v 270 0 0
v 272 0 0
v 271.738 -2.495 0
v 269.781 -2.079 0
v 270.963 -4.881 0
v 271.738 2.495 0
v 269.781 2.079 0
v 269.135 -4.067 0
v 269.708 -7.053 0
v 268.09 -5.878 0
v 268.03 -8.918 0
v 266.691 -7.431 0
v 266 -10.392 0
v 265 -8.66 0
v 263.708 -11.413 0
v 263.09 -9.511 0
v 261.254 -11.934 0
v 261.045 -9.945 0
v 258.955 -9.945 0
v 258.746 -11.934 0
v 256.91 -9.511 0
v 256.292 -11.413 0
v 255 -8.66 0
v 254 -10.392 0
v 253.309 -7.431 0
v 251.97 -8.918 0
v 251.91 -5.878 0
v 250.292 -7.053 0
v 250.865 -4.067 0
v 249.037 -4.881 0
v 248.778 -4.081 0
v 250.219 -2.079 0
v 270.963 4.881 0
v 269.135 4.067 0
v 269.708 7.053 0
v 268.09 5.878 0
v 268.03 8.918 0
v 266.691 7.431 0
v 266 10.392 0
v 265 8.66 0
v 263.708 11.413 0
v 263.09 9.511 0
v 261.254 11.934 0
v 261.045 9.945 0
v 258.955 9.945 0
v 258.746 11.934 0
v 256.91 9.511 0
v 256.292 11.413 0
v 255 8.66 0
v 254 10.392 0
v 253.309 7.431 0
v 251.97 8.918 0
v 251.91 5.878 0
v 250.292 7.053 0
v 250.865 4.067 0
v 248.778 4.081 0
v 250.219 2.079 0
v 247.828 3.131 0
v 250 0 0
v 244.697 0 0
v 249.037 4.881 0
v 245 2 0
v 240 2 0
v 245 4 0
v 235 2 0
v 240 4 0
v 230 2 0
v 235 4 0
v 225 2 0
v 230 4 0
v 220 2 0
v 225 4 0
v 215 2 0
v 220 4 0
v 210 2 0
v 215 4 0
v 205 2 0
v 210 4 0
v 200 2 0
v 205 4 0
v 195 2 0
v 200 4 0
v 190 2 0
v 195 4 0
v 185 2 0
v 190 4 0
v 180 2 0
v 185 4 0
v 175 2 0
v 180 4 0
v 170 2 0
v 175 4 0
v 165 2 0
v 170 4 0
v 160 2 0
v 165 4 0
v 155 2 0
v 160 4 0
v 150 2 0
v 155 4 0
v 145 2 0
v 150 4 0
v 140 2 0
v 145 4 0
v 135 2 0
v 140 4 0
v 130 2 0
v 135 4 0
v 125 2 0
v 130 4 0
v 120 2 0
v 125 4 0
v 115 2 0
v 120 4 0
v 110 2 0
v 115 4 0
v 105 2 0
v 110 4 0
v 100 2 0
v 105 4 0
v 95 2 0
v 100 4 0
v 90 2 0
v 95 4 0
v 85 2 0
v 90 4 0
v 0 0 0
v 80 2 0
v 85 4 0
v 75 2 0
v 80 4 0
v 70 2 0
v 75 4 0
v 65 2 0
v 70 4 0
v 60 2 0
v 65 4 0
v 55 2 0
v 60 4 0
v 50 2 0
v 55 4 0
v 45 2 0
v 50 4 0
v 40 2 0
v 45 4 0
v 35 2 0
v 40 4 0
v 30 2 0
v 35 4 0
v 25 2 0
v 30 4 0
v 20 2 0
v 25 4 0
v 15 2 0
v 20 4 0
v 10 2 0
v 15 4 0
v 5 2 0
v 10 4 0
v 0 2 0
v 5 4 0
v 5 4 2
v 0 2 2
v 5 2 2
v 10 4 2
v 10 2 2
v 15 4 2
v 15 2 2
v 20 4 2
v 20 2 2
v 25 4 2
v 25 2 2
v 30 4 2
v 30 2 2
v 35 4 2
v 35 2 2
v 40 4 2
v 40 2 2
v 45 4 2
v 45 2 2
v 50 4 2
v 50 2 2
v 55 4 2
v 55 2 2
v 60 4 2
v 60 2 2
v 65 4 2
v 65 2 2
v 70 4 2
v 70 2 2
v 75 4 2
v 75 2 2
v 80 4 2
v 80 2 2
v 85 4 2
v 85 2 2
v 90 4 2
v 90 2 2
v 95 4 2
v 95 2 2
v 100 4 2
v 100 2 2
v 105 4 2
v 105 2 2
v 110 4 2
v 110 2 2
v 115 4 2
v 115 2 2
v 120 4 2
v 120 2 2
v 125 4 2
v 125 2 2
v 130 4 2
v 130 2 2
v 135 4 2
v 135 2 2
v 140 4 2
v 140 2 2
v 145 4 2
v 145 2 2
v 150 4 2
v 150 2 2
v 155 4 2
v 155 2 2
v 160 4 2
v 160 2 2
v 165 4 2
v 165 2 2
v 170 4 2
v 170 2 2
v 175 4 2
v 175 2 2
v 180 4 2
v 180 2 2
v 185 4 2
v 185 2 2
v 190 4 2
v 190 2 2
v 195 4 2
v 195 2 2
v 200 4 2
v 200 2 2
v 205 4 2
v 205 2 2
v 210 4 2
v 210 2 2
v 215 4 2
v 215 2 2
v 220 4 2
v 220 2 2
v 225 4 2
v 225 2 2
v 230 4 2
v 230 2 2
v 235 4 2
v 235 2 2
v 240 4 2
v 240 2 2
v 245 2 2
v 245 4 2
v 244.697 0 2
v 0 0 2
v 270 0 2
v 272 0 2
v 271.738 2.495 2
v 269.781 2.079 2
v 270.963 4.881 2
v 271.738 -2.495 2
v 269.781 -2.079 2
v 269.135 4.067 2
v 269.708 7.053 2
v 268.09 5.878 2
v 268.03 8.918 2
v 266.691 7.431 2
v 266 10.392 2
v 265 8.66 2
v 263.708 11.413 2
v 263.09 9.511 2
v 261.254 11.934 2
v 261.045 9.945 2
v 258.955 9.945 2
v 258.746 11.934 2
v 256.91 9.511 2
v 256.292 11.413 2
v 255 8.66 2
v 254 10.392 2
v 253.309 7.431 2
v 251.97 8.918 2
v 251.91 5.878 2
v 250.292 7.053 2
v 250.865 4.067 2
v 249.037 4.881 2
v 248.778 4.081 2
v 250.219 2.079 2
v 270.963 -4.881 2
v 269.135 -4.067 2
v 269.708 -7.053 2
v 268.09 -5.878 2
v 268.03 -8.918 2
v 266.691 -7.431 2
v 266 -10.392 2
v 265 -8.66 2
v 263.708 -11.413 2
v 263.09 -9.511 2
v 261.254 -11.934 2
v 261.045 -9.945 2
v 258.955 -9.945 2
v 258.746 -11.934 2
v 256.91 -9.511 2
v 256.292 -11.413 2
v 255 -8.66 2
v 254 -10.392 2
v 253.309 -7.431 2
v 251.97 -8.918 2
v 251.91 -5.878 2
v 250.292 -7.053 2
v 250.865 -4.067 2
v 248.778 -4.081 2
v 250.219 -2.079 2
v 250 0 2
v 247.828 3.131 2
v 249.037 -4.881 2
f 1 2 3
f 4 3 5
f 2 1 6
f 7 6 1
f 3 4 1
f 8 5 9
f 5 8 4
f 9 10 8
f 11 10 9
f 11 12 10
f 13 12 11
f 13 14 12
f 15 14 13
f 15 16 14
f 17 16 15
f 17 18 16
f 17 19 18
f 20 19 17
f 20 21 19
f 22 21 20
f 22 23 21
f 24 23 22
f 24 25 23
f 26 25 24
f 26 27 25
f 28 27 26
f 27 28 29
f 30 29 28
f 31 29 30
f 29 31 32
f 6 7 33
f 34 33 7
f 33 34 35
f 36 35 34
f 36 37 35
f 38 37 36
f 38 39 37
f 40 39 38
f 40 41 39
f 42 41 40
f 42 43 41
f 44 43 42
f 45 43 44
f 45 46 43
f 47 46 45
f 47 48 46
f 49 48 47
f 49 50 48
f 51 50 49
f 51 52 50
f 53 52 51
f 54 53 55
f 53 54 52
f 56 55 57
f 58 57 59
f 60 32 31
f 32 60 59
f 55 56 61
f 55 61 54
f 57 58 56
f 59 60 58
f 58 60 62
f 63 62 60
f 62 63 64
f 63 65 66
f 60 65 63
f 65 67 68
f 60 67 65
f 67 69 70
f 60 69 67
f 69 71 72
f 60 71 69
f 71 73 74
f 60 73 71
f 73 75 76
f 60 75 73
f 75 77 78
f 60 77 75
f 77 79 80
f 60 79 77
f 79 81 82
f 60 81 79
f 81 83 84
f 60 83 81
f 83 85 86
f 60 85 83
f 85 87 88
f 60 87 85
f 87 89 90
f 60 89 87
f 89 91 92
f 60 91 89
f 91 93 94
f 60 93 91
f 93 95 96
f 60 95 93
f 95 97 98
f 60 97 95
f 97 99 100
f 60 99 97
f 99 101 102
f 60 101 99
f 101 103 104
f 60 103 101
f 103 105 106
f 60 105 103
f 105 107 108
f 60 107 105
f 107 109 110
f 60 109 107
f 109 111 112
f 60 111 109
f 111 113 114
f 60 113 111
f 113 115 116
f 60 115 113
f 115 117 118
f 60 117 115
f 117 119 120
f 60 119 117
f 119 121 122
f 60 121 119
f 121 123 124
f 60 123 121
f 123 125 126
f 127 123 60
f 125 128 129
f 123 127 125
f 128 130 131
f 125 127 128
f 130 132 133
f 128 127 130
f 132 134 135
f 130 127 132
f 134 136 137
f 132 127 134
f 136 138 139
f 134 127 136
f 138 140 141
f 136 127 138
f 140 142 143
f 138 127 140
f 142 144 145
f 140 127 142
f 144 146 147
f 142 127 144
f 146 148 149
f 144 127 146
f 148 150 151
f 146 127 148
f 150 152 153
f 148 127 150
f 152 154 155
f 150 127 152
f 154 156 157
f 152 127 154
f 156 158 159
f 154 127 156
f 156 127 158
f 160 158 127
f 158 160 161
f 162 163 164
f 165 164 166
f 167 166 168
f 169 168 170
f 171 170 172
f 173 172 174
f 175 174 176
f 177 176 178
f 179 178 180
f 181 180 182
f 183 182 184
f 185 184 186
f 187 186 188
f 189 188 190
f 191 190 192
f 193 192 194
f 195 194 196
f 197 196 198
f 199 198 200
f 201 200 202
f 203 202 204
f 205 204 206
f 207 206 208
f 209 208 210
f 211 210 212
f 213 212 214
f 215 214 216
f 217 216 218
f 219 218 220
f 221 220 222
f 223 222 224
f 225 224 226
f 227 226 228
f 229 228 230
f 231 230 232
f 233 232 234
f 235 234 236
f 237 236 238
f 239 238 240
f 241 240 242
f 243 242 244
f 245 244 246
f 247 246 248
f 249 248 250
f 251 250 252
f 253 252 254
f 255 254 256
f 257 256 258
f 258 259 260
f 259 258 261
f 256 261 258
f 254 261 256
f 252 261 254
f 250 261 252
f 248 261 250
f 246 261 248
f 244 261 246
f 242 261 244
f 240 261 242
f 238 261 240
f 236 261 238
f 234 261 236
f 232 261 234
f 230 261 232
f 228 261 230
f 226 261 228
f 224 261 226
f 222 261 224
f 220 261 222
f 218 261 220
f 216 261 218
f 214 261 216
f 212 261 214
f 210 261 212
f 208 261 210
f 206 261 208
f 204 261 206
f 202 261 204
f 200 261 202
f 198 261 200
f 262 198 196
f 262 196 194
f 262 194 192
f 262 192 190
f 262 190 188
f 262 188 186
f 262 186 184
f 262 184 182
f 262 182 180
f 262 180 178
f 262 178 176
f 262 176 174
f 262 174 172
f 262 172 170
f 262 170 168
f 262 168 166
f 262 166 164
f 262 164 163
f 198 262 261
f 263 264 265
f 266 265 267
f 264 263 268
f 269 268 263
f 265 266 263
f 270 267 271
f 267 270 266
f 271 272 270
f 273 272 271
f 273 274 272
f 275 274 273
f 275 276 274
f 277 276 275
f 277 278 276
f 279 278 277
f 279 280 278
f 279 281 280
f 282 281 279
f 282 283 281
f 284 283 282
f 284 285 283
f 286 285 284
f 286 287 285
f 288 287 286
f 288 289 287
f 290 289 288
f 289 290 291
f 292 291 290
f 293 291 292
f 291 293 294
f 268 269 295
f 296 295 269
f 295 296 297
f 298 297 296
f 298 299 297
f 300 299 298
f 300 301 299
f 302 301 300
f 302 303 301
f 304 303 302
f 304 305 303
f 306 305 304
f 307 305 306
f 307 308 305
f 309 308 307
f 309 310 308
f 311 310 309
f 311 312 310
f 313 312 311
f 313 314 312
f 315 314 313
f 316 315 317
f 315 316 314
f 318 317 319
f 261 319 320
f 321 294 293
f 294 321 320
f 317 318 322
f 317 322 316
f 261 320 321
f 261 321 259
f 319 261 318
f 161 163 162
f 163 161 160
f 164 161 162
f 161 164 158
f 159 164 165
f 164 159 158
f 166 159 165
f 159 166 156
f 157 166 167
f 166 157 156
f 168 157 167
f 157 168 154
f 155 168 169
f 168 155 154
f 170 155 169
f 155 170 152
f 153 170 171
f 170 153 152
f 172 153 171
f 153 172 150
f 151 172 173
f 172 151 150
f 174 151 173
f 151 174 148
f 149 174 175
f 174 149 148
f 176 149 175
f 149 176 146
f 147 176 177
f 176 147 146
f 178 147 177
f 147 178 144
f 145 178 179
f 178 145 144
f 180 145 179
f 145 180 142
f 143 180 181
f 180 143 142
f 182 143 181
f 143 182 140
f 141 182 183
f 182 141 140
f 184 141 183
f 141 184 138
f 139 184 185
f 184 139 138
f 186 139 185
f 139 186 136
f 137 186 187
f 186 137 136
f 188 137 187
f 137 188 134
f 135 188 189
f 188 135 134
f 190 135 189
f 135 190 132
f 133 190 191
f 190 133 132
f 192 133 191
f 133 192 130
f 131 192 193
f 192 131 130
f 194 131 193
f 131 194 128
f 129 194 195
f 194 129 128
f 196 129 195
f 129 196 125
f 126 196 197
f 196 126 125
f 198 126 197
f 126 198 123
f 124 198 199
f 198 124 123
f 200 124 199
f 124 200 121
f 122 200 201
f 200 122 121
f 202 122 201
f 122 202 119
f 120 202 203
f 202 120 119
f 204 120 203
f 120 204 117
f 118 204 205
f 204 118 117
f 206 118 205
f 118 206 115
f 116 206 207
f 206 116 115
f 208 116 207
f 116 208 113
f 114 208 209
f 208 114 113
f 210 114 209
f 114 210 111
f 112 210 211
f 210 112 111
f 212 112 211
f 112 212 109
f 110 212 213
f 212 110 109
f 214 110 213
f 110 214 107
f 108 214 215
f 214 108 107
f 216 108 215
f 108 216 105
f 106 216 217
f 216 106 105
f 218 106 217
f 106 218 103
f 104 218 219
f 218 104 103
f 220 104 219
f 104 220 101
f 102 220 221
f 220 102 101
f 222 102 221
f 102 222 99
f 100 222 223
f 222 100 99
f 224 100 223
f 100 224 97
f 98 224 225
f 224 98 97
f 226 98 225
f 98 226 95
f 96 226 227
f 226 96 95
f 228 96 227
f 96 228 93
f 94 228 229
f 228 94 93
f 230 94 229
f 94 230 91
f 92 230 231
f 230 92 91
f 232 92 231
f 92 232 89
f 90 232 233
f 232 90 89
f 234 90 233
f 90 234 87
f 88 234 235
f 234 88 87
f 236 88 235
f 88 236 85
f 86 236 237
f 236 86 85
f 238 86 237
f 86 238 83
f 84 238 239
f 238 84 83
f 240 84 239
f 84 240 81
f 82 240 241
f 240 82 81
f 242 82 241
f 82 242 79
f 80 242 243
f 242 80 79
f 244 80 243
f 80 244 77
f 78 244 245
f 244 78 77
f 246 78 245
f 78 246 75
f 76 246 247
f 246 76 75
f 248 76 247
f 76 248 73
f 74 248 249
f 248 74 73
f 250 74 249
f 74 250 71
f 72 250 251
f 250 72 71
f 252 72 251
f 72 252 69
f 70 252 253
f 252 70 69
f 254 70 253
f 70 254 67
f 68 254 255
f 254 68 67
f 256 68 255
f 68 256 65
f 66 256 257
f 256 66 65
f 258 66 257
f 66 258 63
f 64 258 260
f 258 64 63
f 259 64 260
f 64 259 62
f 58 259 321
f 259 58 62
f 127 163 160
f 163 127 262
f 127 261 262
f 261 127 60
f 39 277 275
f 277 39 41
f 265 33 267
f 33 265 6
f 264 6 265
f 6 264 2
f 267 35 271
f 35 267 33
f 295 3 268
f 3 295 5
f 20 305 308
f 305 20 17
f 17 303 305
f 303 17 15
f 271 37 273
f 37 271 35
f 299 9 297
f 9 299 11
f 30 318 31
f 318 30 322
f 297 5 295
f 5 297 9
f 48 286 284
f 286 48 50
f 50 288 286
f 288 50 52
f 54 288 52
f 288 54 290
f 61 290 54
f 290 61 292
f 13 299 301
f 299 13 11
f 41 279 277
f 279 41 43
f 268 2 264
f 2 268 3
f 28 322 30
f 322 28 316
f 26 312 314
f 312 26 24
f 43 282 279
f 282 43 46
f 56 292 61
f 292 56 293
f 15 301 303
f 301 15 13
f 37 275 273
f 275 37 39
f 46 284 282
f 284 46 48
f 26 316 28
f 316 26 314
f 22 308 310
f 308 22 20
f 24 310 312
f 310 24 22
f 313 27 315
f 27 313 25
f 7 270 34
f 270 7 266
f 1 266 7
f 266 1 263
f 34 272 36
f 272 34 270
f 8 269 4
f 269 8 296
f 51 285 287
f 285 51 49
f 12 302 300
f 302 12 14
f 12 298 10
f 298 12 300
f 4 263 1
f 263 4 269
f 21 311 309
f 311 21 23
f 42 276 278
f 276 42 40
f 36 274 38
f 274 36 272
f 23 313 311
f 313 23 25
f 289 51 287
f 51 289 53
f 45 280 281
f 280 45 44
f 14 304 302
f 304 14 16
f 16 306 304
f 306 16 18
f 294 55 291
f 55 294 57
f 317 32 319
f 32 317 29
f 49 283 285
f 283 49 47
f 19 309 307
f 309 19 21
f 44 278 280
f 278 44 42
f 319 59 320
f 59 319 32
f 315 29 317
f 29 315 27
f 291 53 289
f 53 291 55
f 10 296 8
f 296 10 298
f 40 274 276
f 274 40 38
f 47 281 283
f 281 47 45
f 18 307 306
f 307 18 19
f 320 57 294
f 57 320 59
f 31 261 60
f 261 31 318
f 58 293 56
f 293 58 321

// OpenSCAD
// file: lib/openscad-lib/prism.scad
module prism(points, height) {
    top_points = [ for (p = points) [p[0], p[1], height] ];
    
    points = concat(points, top_points);
    vertices = len(points);
    sides_count = vertices / 2;
    faces = concat(
        [[ for (i = [0:sides_count - 1]) i ]],
        [ for (i = [0:sides_count - 1]) 
            [
                (i + sides_count) % vertices,
                i == sides_count - 1 ? i + 1 : (i + sides_count + 1) % vertices,
                i != sides_count - 1 ? i + 1 : (i + sides_count + 1) % vertices,
                i,
            ]
        ],
        [[ for (i = [vertices - 1:-1:sides_count]) i ]]
    );

    polyhedron(points, faces);
}

module regular_prism(
    sides_count,
    radius = 0,
    sides_length,
    height,
) {
    radius = radius != 0 ? radius : (sides_length / (2 * sin(180 / sides_count)));
    angles = [ for (i = [0:sides_count - 1]) i * (360 / sides_count) ];
    
    base_points = [ for (i = angles) [radius * cos(i), radius * sin(i), 0] ];

    prism(points = base_points, height = height);
}
// file: lib/openscad-lib/gears.scad
use <prism.scad>

module ratchet_gear(
    thickness,
    inner_diameter,
    teeth_length,
    teeth_count,
) {
    inner_radius = inner_diameter / 2;
    angle = 360 / teeth_count;
    angles = [ for (i = [0:angle:360]) i ];

    for (i = [0:teeth_count - 1]) {
        rotate(i * (360 / teeth_count))
        prism(
            [
                [0, 0],
                [0, teeth_length + inner_radius],
                [inner_radius * sin(angle), inner_radius * cos(angle)],
            ],
            thickness
        );
    }
}

module ratchet_stick_pawl(
    thickness,
    length,
    inner_width,
    teeth_length,
    teeth_count,
) {
    teeth_base = length / teeth_count;

    cube([length, inner_width, thickness]);
    translate([0, inner_width])
    for (i = [0:teeth_count - 1]) {
        translate([i * teeth_base, 0])
        prism(
            [
                [0, 0],
                [teeth_base, 0],
                [teeth_base, teeth_length],
            ],
            thickness
        );
    }
}
// main file
use <lib/openscad-lib/gears.scad>

thickness = 2;

module rip_cord(length) {
    ring_inner_diameter = 20;
    ring_thickness = thickness * 2;
    ring_support_hyp = 7.5;

    echo("rip cord length", length + ring_inner_diameter + ring_thickness);

    ratchet_stick_pawl(thickness, length, thickness, thickness, length / 5);
    translate([length + (ring_inner_diameter / 2), 0]) {
        difference() {
            cylinder(thickness, d = ring_inner_diameter + ring_thickness);
            cylinder(thickness, d = ring_inner_diameter);
        }
        difference() {
            translate([-ring_inner_diameter / 2, 0])
            rotate(45)
            translate([-ring_support_hyp / 2, -ring_support_hyp / 2])
            cube([ring_support_hyp, ring_support_hyp, thickness]);
            cylinder(thickness, d = ring_inner_diameter);
        }
    }
}

rip_cord(250);
